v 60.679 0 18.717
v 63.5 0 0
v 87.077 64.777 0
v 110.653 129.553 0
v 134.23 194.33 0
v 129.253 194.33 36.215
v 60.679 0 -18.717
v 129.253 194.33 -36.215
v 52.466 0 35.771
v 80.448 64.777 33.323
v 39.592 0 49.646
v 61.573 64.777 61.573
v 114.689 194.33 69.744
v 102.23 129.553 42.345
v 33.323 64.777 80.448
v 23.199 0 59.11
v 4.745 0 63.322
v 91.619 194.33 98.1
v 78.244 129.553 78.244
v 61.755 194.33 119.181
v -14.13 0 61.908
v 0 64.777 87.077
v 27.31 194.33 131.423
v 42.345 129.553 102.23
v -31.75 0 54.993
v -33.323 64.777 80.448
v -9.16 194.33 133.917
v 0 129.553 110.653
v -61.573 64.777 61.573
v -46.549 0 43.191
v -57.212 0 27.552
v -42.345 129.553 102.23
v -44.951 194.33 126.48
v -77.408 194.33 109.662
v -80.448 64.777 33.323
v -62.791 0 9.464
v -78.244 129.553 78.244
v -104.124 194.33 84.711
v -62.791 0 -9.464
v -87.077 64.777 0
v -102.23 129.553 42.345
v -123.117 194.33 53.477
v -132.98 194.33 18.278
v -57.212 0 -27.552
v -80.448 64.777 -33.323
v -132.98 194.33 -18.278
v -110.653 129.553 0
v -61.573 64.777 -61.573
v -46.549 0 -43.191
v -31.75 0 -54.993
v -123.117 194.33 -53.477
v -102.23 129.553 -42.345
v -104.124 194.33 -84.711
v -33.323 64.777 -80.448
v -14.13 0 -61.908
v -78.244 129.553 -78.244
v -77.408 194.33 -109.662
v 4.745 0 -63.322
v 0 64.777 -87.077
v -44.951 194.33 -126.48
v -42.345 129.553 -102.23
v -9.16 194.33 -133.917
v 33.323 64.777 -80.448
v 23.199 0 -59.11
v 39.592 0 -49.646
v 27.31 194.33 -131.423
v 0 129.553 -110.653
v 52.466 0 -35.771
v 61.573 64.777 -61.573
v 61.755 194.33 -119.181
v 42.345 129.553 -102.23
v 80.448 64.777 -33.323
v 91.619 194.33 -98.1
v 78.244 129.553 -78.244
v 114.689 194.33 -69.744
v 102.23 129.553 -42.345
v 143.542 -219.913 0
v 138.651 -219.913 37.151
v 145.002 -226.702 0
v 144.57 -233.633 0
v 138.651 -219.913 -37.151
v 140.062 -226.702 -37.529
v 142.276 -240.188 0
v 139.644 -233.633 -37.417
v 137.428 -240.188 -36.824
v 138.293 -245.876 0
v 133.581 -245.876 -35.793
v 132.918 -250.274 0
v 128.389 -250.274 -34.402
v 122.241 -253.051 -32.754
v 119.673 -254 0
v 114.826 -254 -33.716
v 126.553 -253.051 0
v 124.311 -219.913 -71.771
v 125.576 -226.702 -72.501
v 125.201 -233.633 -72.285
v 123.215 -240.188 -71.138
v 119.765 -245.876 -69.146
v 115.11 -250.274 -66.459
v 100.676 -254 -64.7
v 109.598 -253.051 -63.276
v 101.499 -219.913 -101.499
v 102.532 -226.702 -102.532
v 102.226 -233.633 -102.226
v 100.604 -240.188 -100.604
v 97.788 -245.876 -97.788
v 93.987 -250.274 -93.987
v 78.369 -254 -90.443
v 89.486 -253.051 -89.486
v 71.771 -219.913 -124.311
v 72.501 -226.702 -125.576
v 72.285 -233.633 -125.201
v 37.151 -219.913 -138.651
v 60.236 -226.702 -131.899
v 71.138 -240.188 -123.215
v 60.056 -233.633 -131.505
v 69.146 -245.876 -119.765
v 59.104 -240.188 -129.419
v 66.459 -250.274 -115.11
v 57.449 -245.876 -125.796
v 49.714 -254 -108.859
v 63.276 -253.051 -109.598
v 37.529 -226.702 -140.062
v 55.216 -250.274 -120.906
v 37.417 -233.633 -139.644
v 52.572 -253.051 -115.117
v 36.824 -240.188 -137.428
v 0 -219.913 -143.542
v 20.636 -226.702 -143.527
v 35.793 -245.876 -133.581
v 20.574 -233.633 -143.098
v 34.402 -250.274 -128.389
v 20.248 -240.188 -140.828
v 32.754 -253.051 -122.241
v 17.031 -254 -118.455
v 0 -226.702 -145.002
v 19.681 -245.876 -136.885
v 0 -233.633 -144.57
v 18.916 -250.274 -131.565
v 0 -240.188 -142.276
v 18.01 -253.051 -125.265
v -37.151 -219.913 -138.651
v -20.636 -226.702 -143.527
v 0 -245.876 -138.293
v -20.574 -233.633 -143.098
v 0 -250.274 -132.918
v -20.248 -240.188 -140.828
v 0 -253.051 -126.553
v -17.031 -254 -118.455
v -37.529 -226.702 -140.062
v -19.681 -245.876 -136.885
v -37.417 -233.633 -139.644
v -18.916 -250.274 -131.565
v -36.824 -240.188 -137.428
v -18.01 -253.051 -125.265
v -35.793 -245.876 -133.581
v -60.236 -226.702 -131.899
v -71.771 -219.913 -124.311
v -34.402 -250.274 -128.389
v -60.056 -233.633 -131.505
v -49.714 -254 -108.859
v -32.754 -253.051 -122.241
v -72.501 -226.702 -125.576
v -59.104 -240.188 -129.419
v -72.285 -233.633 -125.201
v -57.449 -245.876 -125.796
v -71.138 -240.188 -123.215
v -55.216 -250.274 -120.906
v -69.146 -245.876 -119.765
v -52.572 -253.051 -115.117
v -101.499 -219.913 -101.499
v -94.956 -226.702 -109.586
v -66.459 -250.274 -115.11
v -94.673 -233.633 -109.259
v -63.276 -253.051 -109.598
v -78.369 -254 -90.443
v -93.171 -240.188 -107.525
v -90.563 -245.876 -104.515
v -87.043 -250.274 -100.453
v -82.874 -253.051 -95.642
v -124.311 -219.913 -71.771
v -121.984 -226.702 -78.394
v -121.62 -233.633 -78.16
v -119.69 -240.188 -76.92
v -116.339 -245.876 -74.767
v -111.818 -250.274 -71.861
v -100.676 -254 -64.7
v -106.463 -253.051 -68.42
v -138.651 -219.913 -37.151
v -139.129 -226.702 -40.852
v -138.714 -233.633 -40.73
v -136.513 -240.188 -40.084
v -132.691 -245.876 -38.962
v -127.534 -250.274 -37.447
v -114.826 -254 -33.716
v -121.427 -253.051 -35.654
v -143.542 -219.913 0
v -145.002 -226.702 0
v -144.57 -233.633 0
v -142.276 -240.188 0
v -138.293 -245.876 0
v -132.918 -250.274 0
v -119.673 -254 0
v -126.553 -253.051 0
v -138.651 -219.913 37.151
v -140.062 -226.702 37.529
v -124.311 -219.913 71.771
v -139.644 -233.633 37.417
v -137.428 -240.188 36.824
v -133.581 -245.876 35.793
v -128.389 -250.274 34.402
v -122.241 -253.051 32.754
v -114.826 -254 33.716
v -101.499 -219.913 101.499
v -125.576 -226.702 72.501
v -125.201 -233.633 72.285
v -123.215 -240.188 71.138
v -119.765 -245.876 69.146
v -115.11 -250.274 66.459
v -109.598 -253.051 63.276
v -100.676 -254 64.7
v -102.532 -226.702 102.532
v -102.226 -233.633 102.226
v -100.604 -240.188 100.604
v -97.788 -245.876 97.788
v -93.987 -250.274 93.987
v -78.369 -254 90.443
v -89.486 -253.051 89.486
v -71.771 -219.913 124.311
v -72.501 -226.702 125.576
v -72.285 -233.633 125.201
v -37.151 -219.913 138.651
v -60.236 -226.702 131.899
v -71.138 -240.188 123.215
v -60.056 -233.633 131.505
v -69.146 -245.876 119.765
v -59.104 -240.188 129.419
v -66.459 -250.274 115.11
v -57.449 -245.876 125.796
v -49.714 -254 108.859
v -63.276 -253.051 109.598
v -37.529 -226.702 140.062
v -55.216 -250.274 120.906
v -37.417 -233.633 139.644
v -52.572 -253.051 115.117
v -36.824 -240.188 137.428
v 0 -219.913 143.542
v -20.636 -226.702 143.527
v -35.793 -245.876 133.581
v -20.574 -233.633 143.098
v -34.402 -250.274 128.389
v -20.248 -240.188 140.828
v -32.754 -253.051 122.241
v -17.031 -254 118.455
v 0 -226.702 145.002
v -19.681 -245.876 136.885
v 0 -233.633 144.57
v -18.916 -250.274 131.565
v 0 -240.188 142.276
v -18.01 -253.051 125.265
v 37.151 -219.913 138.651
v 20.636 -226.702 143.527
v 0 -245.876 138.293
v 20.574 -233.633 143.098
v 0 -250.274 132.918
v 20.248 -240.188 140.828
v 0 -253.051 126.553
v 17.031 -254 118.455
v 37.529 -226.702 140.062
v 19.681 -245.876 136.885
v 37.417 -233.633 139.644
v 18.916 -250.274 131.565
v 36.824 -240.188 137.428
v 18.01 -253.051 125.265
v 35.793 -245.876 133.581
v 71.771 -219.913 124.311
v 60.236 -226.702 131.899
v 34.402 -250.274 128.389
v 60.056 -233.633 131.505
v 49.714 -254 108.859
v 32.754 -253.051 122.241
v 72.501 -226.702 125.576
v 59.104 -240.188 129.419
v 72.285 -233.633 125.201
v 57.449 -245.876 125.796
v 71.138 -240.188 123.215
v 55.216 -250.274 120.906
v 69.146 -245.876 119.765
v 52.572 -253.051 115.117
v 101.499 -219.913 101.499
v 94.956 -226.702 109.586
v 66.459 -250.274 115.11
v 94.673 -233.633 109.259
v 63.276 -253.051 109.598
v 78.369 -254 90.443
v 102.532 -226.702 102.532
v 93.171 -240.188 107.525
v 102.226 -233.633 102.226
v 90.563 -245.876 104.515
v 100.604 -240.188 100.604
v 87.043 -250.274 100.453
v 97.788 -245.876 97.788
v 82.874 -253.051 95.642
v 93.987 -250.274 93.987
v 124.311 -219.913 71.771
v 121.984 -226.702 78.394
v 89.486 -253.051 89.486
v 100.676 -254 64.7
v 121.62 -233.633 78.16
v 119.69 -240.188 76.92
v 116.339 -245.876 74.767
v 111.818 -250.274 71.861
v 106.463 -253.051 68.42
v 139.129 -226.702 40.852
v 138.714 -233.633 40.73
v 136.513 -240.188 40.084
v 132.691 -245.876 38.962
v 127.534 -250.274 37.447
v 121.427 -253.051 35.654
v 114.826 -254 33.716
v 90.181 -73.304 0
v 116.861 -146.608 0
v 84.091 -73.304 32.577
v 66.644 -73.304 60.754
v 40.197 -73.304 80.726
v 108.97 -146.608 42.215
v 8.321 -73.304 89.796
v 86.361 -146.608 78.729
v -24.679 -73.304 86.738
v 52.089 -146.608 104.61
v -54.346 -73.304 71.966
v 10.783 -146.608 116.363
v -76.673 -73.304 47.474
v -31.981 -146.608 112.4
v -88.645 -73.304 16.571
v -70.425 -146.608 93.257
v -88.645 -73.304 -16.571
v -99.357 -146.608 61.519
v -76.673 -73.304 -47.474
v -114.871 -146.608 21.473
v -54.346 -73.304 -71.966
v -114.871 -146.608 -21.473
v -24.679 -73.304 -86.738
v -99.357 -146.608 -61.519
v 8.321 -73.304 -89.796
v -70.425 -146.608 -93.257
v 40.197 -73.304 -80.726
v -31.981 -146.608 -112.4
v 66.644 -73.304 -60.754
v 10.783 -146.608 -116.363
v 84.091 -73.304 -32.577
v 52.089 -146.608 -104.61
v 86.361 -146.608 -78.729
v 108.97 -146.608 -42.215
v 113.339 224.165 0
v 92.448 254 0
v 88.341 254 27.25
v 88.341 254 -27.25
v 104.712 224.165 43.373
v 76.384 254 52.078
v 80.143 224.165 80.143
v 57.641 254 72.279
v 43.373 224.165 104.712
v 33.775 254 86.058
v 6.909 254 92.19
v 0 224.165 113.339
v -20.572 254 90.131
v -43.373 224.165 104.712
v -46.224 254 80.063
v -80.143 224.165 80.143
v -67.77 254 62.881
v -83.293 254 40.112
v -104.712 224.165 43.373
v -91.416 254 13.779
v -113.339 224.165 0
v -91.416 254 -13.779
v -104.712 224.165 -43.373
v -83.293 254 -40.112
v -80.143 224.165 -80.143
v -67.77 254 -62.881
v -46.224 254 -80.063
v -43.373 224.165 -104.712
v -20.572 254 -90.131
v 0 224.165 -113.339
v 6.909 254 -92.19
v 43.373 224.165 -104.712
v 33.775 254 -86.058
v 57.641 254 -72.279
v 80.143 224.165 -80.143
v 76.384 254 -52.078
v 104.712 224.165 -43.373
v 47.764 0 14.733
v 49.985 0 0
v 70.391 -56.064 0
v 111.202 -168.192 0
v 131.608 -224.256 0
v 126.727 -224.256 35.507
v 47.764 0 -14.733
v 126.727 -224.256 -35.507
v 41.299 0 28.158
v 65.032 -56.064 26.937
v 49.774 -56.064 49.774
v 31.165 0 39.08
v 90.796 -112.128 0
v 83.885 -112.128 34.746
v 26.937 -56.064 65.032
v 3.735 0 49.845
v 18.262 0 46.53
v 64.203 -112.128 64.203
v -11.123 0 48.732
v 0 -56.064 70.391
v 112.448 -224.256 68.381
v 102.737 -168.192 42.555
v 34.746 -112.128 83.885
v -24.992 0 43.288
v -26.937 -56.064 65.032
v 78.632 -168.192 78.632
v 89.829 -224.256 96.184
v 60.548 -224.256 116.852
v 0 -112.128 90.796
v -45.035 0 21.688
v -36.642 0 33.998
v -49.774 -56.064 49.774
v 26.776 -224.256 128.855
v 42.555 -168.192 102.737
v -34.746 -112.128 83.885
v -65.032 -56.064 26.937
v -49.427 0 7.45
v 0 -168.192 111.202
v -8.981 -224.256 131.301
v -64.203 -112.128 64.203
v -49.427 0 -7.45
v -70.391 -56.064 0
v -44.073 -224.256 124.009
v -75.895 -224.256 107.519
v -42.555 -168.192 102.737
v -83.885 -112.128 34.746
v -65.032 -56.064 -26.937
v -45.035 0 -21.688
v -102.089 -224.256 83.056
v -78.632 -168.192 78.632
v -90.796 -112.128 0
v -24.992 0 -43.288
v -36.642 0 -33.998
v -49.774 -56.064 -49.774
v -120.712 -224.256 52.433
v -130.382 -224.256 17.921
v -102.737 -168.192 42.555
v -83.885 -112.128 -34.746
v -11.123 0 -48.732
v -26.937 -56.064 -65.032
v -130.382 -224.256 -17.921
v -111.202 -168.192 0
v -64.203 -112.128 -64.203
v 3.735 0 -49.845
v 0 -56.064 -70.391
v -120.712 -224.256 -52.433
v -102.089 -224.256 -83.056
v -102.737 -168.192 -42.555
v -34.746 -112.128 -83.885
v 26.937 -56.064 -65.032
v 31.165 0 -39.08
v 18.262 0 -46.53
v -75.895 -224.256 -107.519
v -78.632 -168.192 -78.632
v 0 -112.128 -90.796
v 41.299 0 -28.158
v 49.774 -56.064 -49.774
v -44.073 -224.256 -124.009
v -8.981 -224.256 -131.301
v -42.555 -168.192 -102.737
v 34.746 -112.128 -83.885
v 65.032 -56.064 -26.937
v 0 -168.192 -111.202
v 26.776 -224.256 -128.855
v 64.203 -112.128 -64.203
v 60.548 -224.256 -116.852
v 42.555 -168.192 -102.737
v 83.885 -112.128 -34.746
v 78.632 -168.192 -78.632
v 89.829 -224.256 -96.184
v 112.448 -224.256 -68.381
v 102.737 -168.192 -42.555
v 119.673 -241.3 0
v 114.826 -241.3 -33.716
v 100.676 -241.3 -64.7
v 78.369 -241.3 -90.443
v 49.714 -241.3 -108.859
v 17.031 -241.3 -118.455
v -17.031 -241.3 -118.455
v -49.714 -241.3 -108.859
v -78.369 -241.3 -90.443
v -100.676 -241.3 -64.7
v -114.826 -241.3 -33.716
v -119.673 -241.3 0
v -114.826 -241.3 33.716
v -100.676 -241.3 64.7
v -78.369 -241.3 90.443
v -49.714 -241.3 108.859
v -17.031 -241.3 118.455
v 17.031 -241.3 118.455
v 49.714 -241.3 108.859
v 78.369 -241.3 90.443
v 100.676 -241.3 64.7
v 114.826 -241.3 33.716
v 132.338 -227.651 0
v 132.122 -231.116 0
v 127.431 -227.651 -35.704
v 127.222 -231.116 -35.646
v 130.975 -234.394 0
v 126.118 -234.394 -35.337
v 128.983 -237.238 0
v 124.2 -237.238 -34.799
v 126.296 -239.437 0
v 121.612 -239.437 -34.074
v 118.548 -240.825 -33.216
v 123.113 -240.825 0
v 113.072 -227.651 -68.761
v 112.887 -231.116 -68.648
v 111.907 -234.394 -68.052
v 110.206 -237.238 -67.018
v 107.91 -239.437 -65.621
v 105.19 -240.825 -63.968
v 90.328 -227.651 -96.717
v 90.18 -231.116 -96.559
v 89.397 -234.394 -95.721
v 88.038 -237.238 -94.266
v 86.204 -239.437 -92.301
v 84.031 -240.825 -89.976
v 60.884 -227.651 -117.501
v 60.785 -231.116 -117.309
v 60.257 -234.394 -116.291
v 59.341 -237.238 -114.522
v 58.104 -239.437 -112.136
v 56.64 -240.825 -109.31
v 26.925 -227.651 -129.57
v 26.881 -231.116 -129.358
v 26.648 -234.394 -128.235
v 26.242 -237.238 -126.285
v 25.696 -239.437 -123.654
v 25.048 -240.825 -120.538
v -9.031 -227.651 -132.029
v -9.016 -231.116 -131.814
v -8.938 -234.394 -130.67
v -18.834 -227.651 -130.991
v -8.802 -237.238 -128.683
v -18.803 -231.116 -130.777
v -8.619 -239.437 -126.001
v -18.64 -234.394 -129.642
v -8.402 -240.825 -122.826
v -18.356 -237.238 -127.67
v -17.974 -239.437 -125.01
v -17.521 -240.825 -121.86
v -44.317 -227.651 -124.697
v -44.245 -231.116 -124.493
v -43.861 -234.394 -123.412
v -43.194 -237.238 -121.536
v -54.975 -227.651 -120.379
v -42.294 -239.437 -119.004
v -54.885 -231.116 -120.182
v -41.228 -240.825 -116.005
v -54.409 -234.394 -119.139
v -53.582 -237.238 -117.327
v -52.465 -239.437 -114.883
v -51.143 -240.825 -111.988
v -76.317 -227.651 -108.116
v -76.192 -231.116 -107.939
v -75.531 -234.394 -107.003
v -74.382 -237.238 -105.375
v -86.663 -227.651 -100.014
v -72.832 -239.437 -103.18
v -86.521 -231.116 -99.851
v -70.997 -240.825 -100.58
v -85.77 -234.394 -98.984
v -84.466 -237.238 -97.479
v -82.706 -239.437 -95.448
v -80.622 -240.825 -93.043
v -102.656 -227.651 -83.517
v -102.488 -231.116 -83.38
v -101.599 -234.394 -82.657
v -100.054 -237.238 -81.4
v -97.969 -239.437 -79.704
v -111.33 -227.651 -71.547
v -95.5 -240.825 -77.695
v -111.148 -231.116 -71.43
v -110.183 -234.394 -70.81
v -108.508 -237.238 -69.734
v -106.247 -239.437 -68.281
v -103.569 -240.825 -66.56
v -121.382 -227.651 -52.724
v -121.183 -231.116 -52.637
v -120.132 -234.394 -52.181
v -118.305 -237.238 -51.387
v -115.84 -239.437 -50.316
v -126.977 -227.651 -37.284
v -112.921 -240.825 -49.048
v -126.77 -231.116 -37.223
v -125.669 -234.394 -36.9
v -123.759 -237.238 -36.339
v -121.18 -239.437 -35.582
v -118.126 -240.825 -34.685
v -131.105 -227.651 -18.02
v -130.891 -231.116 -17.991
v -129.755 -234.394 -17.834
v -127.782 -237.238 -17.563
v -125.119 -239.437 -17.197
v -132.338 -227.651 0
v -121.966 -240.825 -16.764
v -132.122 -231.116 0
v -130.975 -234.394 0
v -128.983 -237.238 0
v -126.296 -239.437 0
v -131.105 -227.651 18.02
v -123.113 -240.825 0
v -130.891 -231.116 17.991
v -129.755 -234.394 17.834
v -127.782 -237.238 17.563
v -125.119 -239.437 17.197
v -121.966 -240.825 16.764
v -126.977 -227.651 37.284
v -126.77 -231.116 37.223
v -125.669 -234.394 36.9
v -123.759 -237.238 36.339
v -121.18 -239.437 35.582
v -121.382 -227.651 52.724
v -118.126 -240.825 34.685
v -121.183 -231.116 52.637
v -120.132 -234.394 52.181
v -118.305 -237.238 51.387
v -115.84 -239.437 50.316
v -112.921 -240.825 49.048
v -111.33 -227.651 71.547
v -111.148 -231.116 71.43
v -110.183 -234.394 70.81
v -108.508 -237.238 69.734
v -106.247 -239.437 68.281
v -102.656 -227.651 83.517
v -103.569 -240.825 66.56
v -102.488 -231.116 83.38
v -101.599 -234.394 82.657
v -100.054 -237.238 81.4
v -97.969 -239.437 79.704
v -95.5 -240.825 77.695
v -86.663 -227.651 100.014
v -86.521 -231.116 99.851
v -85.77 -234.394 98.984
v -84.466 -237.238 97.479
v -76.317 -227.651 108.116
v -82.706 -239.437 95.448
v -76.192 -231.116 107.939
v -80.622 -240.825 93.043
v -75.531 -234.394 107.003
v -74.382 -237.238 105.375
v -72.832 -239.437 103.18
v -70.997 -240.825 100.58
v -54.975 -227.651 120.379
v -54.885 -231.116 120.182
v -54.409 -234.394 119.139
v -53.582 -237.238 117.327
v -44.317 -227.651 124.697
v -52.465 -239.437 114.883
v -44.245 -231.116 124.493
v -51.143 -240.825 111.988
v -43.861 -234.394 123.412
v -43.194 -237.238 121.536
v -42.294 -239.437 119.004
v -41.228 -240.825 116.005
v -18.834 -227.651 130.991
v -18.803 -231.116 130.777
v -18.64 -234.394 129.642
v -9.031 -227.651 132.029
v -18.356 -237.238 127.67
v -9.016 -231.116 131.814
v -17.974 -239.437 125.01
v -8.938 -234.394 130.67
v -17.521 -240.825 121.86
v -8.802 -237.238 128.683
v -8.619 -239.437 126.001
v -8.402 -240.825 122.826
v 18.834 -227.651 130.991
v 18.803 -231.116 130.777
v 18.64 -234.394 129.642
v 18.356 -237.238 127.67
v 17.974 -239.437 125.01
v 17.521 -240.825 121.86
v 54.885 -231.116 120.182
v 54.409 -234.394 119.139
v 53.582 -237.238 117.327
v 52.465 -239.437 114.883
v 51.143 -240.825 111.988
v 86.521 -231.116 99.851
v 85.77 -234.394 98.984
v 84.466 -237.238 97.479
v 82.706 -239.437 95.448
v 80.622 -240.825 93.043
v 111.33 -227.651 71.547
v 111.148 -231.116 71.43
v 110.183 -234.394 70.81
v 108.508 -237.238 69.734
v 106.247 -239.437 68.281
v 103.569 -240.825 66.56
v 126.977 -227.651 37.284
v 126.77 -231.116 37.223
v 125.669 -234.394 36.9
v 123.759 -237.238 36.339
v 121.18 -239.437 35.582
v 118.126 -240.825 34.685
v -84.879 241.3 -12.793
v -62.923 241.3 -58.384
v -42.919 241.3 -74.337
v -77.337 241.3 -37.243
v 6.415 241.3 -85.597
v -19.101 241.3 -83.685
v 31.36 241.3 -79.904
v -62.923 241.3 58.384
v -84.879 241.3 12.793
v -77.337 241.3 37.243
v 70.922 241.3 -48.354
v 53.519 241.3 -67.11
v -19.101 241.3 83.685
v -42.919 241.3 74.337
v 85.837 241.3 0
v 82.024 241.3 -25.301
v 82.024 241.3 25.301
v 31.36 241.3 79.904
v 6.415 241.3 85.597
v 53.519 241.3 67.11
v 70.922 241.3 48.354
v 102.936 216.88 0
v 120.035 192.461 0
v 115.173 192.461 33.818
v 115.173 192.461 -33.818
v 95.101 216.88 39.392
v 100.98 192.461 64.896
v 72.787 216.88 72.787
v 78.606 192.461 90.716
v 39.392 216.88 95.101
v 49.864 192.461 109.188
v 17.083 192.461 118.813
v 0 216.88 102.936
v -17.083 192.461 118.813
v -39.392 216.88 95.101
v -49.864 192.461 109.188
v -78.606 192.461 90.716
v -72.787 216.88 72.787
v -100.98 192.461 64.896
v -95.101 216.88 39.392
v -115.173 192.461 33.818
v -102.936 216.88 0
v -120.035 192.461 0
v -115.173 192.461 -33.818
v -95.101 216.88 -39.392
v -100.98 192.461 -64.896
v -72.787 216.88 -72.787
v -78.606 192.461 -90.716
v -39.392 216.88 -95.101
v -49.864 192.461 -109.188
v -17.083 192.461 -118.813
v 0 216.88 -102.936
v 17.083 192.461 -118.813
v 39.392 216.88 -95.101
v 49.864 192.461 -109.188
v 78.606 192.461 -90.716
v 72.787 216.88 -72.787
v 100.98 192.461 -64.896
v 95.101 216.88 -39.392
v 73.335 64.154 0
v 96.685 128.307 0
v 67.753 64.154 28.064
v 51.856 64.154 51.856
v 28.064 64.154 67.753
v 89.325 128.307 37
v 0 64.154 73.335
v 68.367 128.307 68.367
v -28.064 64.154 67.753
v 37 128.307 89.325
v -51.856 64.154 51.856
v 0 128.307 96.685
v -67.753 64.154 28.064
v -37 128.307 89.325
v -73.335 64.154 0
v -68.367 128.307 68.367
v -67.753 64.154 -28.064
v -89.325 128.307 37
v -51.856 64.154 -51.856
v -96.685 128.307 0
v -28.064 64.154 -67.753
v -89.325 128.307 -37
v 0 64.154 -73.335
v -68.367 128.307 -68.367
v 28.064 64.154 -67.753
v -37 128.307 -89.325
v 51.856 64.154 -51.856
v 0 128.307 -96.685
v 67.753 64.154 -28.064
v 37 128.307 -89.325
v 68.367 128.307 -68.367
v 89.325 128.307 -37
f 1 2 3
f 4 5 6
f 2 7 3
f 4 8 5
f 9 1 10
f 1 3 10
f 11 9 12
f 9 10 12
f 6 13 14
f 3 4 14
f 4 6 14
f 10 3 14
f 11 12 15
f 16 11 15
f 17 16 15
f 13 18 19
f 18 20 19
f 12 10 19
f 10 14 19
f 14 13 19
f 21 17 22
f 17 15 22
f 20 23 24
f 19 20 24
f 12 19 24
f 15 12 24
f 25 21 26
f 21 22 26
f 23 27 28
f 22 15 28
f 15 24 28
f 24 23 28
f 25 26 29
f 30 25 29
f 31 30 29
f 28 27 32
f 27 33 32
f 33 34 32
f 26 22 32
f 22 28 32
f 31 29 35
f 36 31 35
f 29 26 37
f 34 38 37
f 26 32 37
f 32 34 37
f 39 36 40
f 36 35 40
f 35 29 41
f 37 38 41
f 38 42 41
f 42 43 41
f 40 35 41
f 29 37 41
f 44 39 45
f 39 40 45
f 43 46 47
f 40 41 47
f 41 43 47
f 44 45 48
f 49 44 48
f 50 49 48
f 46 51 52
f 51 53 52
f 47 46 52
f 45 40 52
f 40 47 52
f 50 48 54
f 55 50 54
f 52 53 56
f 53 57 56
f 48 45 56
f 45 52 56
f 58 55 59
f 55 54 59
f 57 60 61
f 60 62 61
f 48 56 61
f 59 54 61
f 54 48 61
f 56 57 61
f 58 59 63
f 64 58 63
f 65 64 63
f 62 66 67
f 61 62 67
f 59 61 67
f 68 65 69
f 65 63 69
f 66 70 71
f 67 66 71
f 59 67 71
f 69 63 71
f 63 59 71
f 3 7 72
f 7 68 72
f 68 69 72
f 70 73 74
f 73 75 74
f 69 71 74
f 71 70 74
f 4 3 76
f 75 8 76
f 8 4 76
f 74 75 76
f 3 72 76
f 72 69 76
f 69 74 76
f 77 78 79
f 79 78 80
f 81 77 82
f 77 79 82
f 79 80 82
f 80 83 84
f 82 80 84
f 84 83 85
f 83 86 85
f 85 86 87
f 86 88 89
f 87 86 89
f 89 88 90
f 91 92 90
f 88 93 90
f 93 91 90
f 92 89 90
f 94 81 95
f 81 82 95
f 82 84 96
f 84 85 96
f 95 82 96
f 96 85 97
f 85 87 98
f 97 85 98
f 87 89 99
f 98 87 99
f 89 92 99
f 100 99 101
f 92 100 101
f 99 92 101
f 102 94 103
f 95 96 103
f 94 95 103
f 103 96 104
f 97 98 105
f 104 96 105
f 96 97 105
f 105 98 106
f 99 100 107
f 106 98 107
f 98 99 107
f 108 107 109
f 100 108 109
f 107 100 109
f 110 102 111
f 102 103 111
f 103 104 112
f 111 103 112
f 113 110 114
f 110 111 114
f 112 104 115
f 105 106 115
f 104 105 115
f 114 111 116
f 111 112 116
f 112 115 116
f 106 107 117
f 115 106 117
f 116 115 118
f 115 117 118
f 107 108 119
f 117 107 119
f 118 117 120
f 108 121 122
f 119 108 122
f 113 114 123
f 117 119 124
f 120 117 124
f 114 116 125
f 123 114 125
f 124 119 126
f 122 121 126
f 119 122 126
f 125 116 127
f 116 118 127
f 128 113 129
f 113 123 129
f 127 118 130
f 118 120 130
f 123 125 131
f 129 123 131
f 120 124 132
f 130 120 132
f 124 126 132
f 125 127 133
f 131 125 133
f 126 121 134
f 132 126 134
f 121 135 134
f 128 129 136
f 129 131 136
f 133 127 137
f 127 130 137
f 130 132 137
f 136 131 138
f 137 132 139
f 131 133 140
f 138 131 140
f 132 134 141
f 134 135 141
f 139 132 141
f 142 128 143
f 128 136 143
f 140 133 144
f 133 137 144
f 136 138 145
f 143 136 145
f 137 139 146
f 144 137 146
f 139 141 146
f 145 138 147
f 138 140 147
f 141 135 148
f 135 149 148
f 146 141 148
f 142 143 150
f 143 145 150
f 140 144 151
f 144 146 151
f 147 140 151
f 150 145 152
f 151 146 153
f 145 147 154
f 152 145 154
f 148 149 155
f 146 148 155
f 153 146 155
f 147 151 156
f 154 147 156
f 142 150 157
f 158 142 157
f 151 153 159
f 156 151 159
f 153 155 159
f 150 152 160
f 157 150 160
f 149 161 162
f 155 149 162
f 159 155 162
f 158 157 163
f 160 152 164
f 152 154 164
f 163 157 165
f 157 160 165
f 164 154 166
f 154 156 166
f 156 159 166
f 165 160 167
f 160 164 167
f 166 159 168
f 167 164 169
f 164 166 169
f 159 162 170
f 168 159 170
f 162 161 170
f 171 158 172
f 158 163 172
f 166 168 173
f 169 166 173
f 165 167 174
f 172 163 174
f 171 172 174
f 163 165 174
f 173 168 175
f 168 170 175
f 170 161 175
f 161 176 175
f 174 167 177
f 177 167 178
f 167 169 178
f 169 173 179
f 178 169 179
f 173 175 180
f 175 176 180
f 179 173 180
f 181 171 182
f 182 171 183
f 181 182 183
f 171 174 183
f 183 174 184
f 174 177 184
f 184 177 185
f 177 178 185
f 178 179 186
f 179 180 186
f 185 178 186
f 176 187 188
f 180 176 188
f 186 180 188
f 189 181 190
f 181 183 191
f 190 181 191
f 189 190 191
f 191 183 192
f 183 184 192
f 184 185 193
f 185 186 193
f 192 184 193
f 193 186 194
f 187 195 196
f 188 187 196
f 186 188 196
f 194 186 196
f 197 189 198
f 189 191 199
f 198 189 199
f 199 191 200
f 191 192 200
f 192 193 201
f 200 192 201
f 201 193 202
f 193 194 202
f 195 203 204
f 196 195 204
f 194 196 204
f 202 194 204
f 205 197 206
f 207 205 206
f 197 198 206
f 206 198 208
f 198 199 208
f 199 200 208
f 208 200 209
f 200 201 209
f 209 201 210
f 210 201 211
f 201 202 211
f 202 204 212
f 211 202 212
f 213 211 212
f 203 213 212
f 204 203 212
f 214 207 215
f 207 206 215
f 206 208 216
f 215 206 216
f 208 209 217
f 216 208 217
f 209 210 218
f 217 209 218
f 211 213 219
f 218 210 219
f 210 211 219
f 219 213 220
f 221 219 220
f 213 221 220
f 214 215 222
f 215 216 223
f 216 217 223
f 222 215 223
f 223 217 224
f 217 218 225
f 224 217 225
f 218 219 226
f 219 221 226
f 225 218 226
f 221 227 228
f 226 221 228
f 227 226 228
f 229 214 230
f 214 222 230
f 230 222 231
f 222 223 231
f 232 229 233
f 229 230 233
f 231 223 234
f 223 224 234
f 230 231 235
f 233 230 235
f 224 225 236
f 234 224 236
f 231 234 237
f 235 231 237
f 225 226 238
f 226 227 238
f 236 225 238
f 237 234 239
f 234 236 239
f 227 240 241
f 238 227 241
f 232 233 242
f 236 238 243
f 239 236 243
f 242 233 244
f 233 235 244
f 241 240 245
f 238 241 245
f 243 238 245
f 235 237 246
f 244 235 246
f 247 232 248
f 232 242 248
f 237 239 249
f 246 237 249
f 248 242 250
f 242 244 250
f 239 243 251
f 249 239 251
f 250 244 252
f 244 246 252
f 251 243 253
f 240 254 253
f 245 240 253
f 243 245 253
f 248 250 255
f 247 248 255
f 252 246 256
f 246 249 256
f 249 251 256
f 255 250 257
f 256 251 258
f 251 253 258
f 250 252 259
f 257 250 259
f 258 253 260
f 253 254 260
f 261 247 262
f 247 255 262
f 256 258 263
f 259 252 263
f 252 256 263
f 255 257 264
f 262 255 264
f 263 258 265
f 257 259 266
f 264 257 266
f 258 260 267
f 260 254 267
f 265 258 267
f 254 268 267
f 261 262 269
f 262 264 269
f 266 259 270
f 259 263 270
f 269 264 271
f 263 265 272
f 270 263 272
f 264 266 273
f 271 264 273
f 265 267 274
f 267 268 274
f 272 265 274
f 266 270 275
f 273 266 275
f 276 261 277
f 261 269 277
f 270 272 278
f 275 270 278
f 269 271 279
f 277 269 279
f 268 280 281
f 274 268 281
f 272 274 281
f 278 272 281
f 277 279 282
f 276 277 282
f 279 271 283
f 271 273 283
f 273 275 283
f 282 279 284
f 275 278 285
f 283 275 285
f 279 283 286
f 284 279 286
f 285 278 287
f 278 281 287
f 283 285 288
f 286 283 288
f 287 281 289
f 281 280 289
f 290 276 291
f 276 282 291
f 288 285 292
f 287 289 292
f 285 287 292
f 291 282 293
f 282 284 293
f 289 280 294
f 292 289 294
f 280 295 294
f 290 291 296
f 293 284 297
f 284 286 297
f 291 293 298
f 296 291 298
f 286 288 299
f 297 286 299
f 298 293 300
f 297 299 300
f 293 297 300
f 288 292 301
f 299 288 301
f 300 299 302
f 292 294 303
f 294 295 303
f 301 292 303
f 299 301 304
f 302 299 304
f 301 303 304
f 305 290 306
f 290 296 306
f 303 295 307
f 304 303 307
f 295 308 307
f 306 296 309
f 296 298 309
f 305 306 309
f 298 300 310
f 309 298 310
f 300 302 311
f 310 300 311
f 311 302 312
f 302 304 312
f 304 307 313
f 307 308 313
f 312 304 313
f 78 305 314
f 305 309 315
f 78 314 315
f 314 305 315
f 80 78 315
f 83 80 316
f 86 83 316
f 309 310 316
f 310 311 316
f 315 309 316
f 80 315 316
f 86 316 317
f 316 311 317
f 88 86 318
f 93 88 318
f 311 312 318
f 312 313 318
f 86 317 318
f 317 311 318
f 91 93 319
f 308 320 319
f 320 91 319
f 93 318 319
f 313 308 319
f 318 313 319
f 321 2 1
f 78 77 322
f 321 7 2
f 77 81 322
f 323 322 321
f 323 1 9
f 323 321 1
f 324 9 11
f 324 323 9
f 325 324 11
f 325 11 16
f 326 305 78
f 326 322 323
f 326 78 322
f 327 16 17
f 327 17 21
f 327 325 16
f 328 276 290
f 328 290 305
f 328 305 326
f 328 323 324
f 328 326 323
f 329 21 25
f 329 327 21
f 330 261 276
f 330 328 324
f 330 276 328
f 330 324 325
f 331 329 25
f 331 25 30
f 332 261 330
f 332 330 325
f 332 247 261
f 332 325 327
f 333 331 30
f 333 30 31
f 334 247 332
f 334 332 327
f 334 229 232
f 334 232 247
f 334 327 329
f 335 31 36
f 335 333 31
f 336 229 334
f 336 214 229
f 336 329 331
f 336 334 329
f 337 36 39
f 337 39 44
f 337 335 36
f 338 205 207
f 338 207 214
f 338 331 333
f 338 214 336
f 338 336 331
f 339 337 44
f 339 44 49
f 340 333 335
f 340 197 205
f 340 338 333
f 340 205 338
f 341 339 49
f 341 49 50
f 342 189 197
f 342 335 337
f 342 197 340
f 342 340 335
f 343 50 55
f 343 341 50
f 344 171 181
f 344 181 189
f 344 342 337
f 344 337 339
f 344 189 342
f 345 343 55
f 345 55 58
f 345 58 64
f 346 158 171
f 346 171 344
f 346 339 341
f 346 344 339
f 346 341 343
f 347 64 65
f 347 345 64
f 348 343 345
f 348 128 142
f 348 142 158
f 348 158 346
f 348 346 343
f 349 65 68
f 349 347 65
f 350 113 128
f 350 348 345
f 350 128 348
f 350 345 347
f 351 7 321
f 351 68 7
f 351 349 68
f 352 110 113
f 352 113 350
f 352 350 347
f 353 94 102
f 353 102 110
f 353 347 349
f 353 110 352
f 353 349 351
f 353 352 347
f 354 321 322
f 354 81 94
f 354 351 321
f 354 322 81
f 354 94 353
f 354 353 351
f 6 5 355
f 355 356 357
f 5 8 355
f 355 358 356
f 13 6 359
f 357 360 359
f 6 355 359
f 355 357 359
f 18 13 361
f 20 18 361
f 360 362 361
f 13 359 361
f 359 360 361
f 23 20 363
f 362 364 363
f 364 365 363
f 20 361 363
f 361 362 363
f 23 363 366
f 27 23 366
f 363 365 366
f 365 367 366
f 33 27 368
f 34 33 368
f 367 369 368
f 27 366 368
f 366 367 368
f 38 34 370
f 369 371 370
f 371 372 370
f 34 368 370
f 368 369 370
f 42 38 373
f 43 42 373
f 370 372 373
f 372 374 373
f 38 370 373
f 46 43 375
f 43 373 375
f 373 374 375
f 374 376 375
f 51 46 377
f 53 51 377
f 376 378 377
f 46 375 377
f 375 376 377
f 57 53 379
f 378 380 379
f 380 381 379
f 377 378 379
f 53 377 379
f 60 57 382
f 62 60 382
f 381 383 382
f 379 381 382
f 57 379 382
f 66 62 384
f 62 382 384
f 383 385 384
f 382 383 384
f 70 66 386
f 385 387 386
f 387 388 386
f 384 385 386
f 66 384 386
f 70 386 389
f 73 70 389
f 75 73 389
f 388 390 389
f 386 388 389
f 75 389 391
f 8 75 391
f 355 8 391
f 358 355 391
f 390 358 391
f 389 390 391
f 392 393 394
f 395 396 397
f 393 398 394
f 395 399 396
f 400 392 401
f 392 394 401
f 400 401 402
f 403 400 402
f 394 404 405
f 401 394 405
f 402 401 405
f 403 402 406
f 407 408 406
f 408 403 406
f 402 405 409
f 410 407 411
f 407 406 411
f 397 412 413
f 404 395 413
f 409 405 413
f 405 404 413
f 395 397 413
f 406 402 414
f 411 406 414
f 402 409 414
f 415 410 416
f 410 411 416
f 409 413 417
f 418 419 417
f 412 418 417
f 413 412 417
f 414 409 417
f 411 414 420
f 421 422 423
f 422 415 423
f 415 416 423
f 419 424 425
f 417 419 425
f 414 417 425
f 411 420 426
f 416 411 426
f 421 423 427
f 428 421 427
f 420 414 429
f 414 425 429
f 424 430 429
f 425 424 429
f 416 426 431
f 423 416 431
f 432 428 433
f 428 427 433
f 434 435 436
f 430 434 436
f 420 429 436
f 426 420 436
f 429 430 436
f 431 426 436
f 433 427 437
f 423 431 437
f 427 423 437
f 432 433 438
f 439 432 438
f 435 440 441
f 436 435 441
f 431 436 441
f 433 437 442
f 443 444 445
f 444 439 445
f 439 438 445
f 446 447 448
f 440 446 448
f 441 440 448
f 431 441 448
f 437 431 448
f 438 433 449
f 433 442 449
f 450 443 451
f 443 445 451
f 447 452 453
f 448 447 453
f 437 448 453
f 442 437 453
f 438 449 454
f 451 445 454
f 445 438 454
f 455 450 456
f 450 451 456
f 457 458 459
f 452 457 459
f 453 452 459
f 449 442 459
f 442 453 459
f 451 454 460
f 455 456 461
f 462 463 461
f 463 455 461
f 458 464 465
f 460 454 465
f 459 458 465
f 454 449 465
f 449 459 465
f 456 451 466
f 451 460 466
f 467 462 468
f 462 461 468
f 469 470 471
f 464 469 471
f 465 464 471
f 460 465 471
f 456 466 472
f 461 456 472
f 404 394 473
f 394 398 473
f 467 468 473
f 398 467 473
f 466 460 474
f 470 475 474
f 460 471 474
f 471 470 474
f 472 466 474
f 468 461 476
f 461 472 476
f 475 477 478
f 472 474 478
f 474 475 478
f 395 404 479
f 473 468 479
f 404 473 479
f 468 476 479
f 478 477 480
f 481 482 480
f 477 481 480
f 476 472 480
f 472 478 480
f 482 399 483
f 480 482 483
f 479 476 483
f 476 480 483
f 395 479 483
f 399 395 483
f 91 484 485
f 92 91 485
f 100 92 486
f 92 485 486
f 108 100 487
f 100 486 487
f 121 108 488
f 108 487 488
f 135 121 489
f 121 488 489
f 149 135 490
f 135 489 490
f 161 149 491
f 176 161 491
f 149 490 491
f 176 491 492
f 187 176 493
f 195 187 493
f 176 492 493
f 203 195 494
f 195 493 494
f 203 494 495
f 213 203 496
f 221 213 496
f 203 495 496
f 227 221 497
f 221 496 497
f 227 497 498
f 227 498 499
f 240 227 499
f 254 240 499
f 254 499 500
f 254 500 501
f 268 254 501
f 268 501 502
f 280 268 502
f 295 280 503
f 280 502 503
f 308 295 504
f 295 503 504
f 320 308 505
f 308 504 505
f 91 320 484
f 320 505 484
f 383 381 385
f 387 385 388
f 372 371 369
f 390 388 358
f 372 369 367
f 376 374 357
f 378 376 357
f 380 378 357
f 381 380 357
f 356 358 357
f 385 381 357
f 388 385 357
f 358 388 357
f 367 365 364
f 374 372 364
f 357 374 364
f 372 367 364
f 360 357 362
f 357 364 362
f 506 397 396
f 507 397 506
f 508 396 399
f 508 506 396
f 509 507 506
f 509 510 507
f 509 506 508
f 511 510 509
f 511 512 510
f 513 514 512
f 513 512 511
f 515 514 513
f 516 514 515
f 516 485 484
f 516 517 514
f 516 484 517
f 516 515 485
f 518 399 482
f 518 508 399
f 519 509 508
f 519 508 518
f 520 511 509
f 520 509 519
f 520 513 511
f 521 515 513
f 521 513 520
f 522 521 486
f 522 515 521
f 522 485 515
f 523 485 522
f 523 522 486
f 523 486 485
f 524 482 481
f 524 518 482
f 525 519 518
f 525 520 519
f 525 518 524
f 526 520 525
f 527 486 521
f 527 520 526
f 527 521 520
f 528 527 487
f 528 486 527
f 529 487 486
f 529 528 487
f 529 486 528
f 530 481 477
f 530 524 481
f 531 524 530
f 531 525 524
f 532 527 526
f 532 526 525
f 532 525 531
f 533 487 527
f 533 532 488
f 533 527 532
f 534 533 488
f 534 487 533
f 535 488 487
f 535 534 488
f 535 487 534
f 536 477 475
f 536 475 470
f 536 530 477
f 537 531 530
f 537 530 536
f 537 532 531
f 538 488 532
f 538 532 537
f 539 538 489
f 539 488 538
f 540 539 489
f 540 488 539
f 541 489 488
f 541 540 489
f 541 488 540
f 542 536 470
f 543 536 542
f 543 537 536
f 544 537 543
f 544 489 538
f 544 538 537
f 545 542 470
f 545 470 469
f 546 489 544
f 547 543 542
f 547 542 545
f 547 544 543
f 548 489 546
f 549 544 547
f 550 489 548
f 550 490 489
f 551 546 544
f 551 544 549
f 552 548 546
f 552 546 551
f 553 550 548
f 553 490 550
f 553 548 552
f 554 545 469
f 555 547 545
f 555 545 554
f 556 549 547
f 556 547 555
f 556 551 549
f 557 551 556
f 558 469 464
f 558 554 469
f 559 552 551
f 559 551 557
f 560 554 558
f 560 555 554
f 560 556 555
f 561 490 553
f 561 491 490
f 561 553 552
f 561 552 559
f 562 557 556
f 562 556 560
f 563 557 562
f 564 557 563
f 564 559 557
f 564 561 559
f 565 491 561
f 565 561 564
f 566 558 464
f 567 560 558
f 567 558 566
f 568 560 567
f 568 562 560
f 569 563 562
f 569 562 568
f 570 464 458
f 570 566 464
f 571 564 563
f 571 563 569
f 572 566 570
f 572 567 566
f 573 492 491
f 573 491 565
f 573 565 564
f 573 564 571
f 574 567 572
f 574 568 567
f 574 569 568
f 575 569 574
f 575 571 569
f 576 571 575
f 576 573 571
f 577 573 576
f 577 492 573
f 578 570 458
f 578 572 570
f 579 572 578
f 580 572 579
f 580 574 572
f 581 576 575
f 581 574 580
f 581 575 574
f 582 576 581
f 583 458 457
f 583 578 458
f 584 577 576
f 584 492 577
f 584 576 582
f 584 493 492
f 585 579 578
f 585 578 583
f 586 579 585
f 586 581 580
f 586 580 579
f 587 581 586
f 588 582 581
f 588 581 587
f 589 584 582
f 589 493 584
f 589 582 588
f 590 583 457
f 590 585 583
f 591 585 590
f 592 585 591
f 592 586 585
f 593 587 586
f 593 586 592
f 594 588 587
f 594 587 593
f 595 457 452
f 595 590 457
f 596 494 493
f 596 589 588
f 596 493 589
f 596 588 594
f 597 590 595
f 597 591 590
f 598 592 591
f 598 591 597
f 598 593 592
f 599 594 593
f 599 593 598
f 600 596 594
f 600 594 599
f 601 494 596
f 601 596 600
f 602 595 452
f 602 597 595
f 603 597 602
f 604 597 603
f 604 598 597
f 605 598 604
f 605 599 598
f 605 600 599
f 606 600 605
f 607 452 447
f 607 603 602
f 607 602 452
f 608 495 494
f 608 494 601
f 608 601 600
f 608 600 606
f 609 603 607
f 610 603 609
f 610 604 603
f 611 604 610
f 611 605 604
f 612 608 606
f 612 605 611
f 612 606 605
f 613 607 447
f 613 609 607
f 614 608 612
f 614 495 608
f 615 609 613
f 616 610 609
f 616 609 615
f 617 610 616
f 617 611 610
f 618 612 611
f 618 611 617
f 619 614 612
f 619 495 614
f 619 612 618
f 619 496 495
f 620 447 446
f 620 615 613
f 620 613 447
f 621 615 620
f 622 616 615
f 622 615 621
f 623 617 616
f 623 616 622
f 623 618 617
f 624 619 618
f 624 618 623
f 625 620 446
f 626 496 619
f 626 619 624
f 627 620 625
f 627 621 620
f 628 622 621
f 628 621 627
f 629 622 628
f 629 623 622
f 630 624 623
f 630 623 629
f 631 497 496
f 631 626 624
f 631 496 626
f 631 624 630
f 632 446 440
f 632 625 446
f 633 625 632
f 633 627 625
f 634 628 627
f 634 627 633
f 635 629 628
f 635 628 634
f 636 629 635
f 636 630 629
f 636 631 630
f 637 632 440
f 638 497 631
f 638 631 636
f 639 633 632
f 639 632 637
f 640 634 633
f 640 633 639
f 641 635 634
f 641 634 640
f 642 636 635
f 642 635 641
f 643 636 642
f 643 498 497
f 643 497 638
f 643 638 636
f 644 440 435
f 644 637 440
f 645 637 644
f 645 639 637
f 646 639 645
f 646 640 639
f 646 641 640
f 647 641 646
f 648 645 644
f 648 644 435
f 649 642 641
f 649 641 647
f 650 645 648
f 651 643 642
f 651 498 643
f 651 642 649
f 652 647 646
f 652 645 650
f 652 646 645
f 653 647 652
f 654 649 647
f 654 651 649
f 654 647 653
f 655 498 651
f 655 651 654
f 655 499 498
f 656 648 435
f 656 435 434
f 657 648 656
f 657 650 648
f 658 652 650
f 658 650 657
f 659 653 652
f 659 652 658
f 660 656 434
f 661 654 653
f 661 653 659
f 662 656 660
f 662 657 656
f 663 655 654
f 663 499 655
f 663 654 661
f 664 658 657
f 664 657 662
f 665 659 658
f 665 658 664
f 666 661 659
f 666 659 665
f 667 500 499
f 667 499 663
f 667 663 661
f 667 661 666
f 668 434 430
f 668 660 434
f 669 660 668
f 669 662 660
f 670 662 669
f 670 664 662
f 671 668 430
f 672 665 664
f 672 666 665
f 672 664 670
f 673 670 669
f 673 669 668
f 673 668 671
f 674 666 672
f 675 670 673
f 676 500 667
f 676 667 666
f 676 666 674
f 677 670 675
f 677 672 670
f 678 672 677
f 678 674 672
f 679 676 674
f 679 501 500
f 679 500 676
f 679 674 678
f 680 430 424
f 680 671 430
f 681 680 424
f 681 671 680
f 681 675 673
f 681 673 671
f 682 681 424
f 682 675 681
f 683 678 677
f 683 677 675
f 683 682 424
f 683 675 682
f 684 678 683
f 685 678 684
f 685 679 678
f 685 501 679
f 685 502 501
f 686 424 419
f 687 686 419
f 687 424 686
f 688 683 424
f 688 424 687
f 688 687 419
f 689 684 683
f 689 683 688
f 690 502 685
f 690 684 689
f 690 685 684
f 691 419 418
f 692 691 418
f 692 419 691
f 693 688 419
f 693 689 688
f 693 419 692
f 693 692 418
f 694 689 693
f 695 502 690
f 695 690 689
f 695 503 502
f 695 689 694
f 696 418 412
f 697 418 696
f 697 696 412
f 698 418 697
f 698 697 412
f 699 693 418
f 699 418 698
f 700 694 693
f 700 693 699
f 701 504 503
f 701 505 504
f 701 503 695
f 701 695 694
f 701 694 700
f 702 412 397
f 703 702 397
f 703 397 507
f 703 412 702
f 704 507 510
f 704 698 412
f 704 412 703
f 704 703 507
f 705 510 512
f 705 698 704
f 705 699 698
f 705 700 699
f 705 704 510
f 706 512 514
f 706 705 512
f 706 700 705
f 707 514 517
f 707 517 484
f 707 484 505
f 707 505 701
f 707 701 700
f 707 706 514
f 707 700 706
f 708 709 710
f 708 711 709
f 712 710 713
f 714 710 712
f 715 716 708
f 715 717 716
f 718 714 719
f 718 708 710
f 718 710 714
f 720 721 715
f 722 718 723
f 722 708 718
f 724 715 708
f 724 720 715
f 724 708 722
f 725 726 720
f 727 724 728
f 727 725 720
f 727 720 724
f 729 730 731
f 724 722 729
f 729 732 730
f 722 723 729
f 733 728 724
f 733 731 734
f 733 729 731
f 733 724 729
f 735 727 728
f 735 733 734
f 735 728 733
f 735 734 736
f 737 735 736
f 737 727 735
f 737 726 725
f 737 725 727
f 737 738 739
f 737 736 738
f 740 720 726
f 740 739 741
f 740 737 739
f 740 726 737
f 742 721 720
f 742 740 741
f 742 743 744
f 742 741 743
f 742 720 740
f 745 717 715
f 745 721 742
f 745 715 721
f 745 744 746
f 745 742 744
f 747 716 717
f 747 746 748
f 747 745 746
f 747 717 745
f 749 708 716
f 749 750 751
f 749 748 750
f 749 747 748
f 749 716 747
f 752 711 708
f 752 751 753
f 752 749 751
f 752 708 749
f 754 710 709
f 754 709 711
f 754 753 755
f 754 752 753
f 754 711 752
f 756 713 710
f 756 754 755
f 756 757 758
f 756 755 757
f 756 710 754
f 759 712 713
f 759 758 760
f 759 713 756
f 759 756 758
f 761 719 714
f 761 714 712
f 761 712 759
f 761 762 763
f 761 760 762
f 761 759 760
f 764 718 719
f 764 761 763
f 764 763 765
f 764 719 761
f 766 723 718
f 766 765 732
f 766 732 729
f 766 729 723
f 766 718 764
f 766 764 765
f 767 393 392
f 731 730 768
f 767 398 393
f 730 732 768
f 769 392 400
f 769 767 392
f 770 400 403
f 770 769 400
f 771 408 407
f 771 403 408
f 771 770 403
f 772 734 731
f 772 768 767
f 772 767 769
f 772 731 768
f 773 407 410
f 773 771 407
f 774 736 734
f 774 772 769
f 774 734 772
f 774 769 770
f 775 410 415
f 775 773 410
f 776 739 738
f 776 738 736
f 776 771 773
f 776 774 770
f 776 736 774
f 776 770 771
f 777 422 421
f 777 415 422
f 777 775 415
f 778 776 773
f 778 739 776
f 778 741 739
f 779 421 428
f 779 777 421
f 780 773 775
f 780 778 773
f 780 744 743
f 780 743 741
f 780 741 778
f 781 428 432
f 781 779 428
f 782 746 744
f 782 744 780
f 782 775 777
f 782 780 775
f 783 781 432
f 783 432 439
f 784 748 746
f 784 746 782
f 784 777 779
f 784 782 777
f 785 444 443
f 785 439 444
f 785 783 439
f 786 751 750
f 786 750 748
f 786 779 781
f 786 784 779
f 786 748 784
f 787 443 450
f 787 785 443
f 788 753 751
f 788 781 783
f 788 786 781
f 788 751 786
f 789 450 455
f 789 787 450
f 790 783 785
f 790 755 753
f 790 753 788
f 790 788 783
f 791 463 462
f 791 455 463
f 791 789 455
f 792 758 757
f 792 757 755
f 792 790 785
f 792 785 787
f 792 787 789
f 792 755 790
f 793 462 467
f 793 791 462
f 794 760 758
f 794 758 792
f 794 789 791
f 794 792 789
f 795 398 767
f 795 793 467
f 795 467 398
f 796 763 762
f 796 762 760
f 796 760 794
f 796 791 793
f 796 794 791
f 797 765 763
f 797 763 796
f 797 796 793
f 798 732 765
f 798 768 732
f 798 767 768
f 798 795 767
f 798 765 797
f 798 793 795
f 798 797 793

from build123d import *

# Parameters (mm, degrees)
F0_R          = 63.5
F1_DEPTH      = 254
F1_TAPER      = -20
F1_DEPTH_BACK = 254
F1_TAPER_BACK = -20
F2_R          = 25.4
F3_SIZE       = 63.5
F4_T          = -12.7


# Not quite as in the source:
# - a shell that OpenCascade refuses in one call is made with other operations: the cavity is built on its own and cut out


with BuildPart() as f1:
    # F0 (on Front) → F1 (new body, two sides)
    with BuildSketch(Plane.XZ) as f1_sk:
        Circle(F0_R)
    extrude(amount=F1_DEPTH, taper=F1_TAPER)
    extrude(f1_sk.sketch, amount=-F1_DEPTH_BACK, taper=F1_TAPER_BACK)

    # F2
    f2_edges = [f1.edges().sort_by_distance(p)[0] for p in [
        (-155.94844, -254, 0),
    ]]
    fillet(f2_edges, radius=F2_R)

    # F3
    f3_edges = [f1.edges().sort_by_distance(p)[0] for p in [
        (-155.94844, 254, 0),
    ]]
    chamfer(f3_edges, length=F3_SIZE)

    # F4: a shell. OpenCascade refuses it in one call, so the cavity is built on its own and cut out:
    # the body offset inwards by the wall thickness, plus a prism from it out through each open face.
    f4_core = offset(f1.part, amount=F4_T, kind=Kind.INTERSECTION, mode=Mode.PRIVATE)
    f4_exits = [f4_core.faces().sort_by_distance(p)[0] for p in [
        (0, -241.3, 0),
    ]]
    add(f4_core, mode=Mode.SUBTRACT)
    extrude(f4_exits, amount=-F4_T, mode=Mode.SUBTRACT)


solid = f1.part
